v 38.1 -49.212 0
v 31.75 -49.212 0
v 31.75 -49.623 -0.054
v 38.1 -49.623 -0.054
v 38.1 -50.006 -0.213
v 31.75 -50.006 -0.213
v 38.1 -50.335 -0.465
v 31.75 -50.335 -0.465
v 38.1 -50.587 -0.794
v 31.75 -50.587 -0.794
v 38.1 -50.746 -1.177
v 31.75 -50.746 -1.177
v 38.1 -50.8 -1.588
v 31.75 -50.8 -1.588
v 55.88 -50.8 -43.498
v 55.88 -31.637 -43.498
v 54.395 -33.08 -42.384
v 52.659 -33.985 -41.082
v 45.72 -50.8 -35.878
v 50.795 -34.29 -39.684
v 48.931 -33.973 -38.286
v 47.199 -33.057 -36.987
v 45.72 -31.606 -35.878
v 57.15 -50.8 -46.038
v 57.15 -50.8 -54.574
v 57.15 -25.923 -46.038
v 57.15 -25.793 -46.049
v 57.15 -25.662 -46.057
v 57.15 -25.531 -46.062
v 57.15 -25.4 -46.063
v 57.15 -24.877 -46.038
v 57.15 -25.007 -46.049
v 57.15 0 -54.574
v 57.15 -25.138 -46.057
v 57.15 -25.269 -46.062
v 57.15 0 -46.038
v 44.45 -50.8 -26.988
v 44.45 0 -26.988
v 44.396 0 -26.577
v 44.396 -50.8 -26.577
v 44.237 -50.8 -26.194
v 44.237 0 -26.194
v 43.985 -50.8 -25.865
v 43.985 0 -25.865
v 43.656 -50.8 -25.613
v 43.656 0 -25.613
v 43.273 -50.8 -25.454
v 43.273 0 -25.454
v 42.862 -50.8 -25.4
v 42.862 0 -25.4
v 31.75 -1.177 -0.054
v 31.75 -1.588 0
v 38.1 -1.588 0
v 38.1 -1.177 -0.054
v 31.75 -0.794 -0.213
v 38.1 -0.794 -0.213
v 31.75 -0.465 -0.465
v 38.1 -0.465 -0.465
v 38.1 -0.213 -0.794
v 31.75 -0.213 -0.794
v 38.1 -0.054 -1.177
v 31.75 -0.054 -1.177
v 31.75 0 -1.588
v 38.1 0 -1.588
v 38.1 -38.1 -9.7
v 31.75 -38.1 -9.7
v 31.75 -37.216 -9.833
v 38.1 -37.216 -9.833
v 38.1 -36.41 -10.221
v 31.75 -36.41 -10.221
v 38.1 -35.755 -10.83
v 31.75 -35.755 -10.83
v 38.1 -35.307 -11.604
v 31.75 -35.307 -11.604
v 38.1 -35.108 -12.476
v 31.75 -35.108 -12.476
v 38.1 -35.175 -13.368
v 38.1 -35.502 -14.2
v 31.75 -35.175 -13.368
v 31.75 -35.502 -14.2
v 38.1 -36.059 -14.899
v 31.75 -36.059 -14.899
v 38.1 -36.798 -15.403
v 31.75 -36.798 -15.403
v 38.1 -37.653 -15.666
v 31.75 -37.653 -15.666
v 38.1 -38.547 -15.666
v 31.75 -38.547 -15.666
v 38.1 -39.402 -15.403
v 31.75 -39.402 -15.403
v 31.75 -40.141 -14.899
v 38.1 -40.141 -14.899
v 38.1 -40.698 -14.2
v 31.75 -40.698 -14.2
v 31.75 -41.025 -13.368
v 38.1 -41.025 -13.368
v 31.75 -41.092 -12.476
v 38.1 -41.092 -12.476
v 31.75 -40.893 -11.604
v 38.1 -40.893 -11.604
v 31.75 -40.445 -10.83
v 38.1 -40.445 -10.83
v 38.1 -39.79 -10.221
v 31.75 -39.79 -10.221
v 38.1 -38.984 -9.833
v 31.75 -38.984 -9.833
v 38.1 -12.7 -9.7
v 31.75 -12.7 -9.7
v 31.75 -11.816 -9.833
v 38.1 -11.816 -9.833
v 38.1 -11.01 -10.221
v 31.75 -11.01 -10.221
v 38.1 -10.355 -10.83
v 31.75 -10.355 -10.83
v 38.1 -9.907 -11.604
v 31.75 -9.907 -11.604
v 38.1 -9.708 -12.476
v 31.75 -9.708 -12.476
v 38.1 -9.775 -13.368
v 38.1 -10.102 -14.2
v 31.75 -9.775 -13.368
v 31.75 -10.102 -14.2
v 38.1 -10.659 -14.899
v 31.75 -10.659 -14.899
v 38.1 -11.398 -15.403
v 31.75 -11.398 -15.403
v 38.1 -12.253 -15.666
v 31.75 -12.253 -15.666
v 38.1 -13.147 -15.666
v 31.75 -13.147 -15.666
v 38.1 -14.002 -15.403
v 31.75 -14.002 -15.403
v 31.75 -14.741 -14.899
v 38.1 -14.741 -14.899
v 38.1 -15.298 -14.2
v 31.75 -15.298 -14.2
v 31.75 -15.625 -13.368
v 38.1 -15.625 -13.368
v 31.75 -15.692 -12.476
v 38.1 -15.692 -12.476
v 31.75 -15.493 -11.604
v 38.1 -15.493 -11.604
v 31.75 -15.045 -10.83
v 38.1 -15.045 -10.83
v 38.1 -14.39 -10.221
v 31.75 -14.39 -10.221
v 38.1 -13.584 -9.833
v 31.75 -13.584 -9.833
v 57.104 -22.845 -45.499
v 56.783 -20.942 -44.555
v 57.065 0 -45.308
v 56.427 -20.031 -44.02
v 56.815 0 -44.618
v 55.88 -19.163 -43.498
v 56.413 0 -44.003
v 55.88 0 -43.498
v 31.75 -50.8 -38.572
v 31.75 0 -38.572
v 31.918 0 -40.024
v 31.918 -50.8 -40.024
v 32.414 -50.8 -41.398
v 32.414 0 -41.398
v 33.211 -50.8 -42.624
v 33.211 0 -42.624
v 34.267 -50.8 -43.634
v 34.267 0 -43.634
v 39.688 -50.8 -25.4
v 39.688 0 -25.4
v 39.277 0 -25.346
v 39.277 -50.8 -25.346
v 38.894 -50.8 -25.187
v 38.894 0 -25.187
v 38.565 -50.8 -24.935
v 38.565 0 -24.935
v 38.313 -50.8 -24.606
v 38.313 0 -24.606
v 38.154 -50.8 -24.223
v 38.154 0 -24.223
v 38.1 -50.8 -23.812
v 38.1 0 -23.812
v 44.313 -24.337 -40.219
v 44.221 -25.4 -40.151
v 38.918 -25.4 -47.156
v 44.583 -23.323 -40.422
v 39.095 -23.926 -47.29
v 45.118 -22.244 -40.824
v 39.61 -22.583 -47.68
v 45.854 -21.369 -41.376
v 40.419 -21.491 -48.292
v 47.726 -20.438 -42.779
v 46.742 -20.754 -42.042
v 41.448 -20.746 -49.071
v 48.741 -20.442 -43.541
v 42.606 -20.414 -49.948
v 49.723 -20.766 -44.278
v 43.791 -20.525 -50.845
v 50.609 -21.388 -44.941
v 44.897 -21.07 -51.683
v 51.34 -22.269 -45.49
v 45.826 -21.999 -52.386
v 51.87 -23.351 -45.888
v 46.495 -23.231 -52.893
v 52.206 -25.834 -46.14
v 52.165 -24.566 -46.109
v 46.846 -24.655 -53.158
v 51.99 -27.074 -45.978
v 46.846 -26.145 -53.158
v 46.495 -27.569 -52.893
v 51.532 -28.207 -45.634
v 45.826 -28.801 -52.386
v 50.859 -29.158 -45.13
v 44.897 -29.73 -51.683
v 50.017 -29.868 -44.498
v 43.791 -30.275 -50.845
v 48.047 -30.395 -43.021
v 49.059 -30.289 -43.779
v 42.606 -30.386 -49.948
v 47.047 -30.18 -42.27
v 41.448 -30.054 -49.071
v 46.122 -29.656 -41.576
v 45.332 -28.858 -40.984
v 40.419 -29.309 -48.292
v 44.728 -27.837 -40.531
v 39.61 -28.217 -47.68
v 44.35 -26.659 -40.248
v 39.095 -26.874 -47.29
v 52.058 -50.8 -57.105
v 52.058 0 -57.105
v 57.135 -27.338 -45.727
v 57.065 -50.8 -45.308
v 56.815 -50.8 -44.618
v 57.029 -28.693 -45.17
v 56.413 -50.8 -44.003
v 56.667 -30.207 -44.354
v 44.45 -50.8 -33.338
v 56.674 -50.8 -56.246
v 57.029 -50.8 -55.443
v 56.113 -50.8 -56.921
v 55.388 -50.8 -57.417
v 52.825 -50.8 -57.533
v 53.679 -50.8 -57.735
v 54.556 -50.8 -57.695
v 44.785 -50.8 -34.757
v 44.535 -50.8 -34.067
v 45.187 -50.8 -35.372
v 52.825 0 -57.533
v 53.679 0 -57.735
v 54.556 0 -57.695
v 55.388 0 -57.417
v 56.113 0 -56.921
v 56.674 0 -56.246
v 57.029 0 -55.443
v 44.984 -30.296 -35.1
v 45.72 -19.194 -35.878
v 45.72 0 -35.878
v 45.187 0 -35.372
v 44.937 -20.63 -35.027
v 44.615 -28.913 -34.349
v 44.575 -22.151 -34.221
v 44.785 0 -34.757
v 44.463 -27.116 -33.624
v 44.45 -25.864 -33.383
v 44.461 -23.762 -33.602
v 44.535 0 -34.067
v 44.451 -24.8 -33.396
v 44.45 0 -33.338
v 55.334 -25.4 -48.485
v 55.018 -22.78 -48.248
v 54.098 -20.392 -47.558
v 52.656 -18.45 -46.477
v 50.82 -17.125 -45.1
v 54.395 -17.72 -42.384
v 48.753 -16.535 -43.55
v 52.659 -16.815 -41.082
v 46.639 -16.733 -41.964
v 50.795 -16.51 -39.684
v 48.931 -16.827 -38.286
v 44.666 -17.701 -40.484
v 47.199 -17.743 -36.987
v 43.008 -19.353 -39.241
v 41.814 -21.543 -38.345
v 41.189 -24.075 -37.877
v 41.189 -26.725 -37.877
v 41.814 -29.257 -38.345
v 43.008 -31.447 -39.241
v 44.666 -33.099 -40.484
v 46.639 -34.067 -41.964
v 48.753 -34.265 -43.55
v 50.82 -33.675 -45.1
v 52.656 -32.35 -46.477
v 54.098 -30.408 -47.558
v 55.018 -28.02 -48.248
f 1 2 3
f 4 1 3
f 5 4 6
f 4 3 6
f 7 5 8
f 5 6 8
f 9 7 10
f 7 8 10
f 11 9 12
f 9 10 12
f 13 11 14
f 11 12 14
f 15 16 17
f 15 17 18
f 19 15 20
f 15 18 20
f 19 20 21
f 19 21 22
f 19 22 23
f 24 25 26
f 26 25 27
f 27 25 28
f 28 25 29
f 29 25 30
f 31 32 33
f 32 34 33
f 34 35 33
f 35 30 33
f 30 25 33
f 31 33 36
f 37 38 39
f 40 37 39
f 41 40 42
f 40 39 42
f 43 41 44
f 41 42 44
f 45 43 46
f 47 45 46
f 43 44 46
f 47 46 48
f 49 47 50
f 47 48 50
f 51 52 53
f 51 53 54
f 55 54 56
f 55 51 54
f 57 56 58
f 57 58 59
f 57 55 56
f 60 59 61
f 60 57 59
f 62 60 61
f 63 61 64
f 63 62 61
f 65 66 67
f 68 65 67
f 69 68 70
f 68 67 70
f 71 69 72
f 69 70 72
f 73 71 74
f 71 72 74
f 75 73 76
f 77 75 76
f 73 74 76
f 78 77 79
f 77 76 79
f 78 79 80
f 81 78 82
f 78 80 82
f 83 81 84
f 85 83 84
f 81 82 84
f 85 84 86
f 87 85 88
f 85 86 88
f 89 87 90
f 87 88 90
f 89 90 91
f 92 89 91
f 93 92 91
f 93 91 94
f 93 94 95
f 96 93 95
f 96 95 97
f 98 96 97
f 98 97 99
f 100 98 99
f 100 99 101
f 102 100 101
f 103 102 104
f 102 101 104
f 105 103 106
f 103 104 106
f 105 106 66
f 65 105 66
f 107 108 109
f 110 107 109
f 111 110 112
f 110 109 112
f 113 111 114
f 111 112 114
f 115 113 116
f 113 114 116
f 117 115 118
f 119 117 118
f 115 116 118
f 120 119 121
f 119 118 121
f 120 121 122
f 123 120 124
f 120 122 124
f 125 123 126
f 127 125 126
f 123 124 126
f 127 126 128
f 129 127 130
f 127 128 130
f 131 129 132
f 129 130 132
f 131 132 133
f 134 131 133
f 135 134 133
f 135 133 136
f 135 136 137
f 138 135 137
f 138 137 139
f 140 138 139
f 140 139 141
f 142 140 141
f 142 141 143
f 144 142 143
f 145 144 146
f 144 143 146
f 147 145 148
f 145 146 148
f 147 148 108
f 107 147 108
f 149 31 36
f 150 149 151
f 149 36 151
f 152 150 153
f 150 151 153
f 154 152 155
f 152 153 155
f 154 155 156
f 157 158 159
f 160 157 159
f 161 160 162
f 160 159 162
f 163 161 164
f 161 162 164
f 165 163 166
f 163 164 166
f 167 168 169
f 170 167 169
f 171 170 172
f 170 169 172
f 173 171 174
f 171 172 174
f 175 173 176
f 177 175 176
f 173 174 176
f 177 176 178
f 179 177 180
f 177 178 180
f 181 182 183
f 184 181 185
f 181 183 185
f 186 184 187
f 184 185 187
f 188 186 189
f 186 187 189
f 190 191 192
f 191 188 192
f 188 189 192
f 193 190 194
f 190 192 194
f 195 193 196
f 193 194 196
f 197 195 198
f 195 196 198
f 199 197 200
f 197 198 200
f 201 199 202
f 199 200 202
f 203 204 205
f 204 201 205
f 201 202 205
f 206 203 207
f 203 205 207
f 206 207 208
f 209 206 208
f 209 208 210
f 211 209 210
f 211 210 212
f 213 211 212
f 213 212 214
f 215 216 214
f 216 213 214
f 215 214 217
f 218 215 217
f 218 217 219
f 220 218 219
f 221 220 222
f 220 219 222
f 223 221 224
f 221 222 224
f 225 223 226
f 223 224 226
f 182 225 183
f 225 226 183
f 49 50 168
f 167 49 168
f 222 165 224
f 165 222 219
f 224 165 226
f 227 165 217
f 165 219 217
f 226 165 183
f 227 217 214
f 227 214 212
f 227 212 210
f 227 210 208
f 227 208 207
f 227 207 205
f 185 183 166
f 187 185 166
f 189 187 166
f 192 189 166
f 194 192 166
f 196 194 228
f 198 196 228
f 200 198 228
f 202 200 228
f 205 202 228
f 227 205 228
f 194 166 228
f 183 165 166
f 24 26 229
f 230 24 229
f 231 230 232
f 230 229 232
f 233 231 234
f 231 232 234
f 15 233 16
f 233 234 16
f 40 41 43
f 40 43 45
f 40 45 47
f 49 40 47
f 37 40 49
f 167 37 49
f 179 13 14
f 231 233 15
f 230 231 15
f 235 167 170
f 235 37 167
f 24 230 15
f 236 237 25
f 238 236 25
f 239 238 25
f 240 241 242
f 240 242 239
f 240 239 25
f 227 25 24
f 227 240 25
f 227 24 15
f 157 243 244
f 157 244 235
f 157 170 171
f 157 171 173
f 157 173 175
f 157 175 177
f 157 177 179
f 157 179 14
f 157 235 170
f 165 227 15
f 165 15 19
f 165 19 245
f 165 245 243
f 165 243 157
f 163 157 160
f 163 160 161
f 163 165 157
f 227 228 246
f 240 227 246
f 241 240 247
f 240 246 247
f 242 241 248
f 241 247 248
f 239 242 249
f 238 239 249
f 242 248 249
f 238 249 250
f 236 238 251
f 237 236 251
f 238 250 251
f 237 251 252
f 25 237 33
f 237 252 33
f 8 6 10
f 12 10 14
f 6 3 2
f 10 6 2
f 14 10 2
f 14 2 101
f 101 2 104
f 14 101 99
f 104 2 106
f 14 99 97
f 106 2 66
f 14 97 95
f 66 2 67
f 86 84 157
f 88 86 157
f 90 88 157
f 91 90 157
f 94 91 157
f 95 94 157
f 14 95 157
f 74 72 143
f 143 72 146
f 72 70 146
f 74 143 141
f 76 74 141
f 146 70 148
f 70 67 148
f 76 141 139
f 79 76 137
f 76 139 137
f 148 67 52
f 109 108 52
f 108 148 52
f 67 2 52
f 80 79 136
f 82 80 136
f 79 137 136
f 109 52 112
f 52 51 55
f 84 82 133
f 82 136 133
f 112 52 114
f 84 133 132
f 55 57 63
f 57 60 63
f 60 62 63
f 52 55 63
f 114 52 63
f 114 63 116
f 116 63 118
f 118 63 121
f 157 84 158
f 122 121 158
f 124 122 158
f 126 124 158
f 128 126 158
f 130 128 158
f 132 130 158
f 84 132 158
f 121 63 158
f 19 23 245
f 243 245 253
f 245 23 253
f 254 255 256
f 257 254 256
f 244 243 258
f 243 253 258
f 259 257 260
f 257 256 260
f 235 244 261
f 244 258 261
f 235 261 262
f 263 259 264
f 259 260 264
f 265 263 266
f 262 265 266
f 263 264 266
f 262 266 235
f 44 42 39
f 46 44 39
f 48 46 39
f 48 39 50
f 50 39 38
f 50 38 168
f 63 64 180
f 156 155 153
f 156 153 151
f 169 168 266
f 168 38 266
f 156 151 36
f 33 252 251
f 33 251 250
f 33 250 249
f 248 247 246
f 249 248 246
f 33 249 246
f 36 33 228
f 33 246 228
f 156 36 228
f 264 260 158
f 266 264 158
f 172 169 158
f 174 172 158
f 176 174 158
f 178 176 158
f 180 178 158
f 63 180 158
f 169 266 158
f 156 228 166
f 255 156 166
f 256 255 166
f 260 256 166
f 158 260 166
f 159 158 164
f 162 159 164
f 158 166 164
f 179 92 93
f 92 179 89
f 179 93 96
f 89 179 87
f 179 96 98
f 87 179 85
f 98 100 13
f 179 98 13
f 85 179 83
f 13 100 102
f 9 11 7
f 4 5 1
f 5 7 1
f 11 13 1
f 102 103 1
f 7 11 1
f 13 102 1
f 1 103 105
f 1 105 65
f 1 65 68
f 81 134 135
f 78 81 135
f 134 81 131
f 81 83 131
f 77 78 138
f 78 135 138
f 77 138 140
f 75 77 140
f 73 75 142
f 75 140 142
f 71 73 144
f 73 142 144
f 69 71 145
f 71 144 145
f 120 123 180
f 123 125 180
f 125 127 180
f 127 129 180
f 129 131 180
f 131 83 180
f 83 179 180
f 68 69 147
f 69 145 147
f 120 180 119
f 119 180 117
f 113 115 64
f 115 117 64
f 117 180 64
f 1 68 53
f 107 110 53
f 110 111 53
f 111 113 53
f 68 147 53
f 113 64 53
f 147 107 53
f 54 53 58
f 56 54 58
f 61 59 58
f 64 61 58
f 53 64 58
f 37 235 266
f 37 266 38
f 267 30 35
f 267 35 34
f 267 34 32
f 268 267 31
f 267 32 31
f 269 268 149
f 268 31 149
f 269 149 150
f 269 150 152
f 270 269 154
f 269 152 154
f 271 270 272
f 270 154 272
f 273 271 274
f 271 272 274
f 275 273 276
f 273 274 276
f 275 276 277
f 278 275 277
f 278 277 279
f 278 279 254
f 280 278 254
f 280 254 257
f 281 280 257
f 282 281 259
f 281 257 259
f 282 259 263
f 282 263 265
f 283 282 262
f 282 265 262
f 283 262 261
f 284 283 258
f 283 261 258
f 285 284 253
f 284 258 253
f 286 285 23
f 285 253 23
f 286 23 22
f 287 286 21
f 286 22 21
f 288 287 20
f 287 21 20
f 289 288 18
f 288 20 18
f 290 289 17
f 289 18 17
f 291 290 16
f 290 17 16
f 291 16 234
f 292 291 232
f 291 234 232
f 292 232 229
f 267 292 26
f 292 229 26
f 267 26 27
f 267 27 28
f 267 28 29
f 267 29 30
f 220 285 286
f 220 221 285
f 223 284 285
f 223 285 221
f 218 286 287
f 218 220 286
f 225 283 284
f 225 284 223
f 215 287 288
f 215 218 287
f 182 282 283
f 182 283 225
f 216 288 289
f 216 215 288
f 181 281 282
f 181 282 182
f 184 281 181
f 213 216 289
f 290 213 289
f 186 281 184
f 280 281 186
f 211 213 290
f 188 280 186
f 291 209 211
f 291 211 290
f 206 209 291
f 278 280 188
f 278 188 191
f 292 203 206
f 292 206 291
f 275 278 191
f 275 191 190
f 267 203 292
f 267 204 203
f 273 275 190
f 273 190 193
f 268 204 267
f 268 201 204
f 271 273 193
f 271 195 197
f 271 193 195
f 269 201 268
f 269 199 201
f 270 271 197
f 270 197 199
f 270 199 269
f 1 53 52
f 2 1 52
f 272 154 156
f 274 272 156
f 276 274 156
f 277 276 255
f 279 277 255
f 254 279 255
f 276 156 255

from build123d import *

# Parameters (mm, degrees)
BOSS_EXTRUDE1_DEPTH = 50.8
SKETCH15_R          = 5
CUT_EXTRUDE14_DEPTH = 8.89
SKETCH16_R          = 8.89
CUT_EXTRUDE15_DEPTH = 6.858
SKETCH17_R          = 3
CUT_EXTRUDE16_DEPTH = 6.35


with BuildPart() as part:
    # Sketch1 → Boss-Extrude1 (new body)
    with BuildSketch(Plane(origin=(0, 0, 0), x_dir=(1, 0, 0), z_dir=(0, 1, 0))):
        with BuildLine():
            Line((31.75, 0), (31.75, 13.171631631))
            Line((31.75, 13.171631631), (31.75, 38.571631565))
            ThreePointArc((31.75, 38.571631565), (32.413933313, 41.398493011), (34.266896261, 43.63422139))
            Line((34.266896261, 43.63422139), (52.058448131, 57.104967856))
            ThreePointArc((52.058448131, 57.104967856), (55.388430723, 57.416706287), (57.15, 54.573672944))
            Line((57.15, 54.573672944), (57.15, 46.0375))
            ThreePointArc((57.15, 46.0375), (56.814806331, 44.617596834), (55.88, 43.4975))
            Line((55.88, 43.4975), (45.72, 35.8775))
            ThreePointArc((45.72, 35.8775), (44.785193669, 34.757403166), (44.45, 33.3375))
            Line((44.45, 33.3375), (44.45, 26.9875))
            ThreePointArc((44.45, 26.9875), (43.985032015, 25.864967985), (42.8625, 25.4))
            Line((42.8625, 25.4), (39.6875, 25.4))
            ThreePointArc((39.6875, 25.4), (38.564967985, 24.935032015), (38.1, 23.8125))
            Line((38.1, 23.8125), (38.1, 0))
            Line((38.1, 0), (31.75, 0))
        make_face()
    extrude(amount=-BOSS_EXTRUDE1_DEPTH)

    # Sketch15 → Cut-Extrude14 (cut)
    with BuildSketch(Plane(origin=(-8.51306907, 0, -11.243676088), x_dir=(-0.79725824, 0, 0.603638384), z_dir=(-0.603638384, 0, -0.79725824))):
        with Locations((-64.492331876, -25.4)):
            Circle(SKETCH15_R)
    extrude(amount=-CUT_EXTRUDE14_DEPTH, mode=Mode.SUBTRACT)

    # Sketch16 → Cut-Extrude15 (cut)
    with BuildSketch(Plane(origin=(0.762, 0, 1.016), x_dir=(0.8, 0, -0.6), z_dir=(0.6, 0, 0.8))):
        with Locations((64.467913736, -25.4)):
            Circle(SKETCH16_R)
    extrude(amount=-CUT_EXTRUDE15_DEPTH, mode=Mode.SUBTRACT)

    # Sketch17 → Cut-Extrude16 (cut)
    with BuildSketch(Plane.ZY.offset(-31.75)):
        with Locations((-12.7, -12.7)):
            Circle(SKETCH17_R)
        with Locations((-12.7, -38.1)):
            Circle(SKETCH17_R)
        with BuildLine():
            Line((-1.5875, -50.8), (0, -50.8))
            Line((0, -50.8), (0, -49.2125))
            ThreePointArc((0, -49.2125), (-0.464967985, -50.335032015), (-1.5875, -50.8))
        make_face()
        with BuildLine():
            Line((-1.5875, 0), (0, 0))
            Line((0, 0), (0, -1.5875))
            ThreePointArc((0, -1.5875), (-0.464967985, -0.464967985), (-1.5875, 0))
        make_face()
    extrude(amount=-CUT_EXTRUDE16_DEPTH, mode=Mode.SUBTRACT)


solid = part.part
